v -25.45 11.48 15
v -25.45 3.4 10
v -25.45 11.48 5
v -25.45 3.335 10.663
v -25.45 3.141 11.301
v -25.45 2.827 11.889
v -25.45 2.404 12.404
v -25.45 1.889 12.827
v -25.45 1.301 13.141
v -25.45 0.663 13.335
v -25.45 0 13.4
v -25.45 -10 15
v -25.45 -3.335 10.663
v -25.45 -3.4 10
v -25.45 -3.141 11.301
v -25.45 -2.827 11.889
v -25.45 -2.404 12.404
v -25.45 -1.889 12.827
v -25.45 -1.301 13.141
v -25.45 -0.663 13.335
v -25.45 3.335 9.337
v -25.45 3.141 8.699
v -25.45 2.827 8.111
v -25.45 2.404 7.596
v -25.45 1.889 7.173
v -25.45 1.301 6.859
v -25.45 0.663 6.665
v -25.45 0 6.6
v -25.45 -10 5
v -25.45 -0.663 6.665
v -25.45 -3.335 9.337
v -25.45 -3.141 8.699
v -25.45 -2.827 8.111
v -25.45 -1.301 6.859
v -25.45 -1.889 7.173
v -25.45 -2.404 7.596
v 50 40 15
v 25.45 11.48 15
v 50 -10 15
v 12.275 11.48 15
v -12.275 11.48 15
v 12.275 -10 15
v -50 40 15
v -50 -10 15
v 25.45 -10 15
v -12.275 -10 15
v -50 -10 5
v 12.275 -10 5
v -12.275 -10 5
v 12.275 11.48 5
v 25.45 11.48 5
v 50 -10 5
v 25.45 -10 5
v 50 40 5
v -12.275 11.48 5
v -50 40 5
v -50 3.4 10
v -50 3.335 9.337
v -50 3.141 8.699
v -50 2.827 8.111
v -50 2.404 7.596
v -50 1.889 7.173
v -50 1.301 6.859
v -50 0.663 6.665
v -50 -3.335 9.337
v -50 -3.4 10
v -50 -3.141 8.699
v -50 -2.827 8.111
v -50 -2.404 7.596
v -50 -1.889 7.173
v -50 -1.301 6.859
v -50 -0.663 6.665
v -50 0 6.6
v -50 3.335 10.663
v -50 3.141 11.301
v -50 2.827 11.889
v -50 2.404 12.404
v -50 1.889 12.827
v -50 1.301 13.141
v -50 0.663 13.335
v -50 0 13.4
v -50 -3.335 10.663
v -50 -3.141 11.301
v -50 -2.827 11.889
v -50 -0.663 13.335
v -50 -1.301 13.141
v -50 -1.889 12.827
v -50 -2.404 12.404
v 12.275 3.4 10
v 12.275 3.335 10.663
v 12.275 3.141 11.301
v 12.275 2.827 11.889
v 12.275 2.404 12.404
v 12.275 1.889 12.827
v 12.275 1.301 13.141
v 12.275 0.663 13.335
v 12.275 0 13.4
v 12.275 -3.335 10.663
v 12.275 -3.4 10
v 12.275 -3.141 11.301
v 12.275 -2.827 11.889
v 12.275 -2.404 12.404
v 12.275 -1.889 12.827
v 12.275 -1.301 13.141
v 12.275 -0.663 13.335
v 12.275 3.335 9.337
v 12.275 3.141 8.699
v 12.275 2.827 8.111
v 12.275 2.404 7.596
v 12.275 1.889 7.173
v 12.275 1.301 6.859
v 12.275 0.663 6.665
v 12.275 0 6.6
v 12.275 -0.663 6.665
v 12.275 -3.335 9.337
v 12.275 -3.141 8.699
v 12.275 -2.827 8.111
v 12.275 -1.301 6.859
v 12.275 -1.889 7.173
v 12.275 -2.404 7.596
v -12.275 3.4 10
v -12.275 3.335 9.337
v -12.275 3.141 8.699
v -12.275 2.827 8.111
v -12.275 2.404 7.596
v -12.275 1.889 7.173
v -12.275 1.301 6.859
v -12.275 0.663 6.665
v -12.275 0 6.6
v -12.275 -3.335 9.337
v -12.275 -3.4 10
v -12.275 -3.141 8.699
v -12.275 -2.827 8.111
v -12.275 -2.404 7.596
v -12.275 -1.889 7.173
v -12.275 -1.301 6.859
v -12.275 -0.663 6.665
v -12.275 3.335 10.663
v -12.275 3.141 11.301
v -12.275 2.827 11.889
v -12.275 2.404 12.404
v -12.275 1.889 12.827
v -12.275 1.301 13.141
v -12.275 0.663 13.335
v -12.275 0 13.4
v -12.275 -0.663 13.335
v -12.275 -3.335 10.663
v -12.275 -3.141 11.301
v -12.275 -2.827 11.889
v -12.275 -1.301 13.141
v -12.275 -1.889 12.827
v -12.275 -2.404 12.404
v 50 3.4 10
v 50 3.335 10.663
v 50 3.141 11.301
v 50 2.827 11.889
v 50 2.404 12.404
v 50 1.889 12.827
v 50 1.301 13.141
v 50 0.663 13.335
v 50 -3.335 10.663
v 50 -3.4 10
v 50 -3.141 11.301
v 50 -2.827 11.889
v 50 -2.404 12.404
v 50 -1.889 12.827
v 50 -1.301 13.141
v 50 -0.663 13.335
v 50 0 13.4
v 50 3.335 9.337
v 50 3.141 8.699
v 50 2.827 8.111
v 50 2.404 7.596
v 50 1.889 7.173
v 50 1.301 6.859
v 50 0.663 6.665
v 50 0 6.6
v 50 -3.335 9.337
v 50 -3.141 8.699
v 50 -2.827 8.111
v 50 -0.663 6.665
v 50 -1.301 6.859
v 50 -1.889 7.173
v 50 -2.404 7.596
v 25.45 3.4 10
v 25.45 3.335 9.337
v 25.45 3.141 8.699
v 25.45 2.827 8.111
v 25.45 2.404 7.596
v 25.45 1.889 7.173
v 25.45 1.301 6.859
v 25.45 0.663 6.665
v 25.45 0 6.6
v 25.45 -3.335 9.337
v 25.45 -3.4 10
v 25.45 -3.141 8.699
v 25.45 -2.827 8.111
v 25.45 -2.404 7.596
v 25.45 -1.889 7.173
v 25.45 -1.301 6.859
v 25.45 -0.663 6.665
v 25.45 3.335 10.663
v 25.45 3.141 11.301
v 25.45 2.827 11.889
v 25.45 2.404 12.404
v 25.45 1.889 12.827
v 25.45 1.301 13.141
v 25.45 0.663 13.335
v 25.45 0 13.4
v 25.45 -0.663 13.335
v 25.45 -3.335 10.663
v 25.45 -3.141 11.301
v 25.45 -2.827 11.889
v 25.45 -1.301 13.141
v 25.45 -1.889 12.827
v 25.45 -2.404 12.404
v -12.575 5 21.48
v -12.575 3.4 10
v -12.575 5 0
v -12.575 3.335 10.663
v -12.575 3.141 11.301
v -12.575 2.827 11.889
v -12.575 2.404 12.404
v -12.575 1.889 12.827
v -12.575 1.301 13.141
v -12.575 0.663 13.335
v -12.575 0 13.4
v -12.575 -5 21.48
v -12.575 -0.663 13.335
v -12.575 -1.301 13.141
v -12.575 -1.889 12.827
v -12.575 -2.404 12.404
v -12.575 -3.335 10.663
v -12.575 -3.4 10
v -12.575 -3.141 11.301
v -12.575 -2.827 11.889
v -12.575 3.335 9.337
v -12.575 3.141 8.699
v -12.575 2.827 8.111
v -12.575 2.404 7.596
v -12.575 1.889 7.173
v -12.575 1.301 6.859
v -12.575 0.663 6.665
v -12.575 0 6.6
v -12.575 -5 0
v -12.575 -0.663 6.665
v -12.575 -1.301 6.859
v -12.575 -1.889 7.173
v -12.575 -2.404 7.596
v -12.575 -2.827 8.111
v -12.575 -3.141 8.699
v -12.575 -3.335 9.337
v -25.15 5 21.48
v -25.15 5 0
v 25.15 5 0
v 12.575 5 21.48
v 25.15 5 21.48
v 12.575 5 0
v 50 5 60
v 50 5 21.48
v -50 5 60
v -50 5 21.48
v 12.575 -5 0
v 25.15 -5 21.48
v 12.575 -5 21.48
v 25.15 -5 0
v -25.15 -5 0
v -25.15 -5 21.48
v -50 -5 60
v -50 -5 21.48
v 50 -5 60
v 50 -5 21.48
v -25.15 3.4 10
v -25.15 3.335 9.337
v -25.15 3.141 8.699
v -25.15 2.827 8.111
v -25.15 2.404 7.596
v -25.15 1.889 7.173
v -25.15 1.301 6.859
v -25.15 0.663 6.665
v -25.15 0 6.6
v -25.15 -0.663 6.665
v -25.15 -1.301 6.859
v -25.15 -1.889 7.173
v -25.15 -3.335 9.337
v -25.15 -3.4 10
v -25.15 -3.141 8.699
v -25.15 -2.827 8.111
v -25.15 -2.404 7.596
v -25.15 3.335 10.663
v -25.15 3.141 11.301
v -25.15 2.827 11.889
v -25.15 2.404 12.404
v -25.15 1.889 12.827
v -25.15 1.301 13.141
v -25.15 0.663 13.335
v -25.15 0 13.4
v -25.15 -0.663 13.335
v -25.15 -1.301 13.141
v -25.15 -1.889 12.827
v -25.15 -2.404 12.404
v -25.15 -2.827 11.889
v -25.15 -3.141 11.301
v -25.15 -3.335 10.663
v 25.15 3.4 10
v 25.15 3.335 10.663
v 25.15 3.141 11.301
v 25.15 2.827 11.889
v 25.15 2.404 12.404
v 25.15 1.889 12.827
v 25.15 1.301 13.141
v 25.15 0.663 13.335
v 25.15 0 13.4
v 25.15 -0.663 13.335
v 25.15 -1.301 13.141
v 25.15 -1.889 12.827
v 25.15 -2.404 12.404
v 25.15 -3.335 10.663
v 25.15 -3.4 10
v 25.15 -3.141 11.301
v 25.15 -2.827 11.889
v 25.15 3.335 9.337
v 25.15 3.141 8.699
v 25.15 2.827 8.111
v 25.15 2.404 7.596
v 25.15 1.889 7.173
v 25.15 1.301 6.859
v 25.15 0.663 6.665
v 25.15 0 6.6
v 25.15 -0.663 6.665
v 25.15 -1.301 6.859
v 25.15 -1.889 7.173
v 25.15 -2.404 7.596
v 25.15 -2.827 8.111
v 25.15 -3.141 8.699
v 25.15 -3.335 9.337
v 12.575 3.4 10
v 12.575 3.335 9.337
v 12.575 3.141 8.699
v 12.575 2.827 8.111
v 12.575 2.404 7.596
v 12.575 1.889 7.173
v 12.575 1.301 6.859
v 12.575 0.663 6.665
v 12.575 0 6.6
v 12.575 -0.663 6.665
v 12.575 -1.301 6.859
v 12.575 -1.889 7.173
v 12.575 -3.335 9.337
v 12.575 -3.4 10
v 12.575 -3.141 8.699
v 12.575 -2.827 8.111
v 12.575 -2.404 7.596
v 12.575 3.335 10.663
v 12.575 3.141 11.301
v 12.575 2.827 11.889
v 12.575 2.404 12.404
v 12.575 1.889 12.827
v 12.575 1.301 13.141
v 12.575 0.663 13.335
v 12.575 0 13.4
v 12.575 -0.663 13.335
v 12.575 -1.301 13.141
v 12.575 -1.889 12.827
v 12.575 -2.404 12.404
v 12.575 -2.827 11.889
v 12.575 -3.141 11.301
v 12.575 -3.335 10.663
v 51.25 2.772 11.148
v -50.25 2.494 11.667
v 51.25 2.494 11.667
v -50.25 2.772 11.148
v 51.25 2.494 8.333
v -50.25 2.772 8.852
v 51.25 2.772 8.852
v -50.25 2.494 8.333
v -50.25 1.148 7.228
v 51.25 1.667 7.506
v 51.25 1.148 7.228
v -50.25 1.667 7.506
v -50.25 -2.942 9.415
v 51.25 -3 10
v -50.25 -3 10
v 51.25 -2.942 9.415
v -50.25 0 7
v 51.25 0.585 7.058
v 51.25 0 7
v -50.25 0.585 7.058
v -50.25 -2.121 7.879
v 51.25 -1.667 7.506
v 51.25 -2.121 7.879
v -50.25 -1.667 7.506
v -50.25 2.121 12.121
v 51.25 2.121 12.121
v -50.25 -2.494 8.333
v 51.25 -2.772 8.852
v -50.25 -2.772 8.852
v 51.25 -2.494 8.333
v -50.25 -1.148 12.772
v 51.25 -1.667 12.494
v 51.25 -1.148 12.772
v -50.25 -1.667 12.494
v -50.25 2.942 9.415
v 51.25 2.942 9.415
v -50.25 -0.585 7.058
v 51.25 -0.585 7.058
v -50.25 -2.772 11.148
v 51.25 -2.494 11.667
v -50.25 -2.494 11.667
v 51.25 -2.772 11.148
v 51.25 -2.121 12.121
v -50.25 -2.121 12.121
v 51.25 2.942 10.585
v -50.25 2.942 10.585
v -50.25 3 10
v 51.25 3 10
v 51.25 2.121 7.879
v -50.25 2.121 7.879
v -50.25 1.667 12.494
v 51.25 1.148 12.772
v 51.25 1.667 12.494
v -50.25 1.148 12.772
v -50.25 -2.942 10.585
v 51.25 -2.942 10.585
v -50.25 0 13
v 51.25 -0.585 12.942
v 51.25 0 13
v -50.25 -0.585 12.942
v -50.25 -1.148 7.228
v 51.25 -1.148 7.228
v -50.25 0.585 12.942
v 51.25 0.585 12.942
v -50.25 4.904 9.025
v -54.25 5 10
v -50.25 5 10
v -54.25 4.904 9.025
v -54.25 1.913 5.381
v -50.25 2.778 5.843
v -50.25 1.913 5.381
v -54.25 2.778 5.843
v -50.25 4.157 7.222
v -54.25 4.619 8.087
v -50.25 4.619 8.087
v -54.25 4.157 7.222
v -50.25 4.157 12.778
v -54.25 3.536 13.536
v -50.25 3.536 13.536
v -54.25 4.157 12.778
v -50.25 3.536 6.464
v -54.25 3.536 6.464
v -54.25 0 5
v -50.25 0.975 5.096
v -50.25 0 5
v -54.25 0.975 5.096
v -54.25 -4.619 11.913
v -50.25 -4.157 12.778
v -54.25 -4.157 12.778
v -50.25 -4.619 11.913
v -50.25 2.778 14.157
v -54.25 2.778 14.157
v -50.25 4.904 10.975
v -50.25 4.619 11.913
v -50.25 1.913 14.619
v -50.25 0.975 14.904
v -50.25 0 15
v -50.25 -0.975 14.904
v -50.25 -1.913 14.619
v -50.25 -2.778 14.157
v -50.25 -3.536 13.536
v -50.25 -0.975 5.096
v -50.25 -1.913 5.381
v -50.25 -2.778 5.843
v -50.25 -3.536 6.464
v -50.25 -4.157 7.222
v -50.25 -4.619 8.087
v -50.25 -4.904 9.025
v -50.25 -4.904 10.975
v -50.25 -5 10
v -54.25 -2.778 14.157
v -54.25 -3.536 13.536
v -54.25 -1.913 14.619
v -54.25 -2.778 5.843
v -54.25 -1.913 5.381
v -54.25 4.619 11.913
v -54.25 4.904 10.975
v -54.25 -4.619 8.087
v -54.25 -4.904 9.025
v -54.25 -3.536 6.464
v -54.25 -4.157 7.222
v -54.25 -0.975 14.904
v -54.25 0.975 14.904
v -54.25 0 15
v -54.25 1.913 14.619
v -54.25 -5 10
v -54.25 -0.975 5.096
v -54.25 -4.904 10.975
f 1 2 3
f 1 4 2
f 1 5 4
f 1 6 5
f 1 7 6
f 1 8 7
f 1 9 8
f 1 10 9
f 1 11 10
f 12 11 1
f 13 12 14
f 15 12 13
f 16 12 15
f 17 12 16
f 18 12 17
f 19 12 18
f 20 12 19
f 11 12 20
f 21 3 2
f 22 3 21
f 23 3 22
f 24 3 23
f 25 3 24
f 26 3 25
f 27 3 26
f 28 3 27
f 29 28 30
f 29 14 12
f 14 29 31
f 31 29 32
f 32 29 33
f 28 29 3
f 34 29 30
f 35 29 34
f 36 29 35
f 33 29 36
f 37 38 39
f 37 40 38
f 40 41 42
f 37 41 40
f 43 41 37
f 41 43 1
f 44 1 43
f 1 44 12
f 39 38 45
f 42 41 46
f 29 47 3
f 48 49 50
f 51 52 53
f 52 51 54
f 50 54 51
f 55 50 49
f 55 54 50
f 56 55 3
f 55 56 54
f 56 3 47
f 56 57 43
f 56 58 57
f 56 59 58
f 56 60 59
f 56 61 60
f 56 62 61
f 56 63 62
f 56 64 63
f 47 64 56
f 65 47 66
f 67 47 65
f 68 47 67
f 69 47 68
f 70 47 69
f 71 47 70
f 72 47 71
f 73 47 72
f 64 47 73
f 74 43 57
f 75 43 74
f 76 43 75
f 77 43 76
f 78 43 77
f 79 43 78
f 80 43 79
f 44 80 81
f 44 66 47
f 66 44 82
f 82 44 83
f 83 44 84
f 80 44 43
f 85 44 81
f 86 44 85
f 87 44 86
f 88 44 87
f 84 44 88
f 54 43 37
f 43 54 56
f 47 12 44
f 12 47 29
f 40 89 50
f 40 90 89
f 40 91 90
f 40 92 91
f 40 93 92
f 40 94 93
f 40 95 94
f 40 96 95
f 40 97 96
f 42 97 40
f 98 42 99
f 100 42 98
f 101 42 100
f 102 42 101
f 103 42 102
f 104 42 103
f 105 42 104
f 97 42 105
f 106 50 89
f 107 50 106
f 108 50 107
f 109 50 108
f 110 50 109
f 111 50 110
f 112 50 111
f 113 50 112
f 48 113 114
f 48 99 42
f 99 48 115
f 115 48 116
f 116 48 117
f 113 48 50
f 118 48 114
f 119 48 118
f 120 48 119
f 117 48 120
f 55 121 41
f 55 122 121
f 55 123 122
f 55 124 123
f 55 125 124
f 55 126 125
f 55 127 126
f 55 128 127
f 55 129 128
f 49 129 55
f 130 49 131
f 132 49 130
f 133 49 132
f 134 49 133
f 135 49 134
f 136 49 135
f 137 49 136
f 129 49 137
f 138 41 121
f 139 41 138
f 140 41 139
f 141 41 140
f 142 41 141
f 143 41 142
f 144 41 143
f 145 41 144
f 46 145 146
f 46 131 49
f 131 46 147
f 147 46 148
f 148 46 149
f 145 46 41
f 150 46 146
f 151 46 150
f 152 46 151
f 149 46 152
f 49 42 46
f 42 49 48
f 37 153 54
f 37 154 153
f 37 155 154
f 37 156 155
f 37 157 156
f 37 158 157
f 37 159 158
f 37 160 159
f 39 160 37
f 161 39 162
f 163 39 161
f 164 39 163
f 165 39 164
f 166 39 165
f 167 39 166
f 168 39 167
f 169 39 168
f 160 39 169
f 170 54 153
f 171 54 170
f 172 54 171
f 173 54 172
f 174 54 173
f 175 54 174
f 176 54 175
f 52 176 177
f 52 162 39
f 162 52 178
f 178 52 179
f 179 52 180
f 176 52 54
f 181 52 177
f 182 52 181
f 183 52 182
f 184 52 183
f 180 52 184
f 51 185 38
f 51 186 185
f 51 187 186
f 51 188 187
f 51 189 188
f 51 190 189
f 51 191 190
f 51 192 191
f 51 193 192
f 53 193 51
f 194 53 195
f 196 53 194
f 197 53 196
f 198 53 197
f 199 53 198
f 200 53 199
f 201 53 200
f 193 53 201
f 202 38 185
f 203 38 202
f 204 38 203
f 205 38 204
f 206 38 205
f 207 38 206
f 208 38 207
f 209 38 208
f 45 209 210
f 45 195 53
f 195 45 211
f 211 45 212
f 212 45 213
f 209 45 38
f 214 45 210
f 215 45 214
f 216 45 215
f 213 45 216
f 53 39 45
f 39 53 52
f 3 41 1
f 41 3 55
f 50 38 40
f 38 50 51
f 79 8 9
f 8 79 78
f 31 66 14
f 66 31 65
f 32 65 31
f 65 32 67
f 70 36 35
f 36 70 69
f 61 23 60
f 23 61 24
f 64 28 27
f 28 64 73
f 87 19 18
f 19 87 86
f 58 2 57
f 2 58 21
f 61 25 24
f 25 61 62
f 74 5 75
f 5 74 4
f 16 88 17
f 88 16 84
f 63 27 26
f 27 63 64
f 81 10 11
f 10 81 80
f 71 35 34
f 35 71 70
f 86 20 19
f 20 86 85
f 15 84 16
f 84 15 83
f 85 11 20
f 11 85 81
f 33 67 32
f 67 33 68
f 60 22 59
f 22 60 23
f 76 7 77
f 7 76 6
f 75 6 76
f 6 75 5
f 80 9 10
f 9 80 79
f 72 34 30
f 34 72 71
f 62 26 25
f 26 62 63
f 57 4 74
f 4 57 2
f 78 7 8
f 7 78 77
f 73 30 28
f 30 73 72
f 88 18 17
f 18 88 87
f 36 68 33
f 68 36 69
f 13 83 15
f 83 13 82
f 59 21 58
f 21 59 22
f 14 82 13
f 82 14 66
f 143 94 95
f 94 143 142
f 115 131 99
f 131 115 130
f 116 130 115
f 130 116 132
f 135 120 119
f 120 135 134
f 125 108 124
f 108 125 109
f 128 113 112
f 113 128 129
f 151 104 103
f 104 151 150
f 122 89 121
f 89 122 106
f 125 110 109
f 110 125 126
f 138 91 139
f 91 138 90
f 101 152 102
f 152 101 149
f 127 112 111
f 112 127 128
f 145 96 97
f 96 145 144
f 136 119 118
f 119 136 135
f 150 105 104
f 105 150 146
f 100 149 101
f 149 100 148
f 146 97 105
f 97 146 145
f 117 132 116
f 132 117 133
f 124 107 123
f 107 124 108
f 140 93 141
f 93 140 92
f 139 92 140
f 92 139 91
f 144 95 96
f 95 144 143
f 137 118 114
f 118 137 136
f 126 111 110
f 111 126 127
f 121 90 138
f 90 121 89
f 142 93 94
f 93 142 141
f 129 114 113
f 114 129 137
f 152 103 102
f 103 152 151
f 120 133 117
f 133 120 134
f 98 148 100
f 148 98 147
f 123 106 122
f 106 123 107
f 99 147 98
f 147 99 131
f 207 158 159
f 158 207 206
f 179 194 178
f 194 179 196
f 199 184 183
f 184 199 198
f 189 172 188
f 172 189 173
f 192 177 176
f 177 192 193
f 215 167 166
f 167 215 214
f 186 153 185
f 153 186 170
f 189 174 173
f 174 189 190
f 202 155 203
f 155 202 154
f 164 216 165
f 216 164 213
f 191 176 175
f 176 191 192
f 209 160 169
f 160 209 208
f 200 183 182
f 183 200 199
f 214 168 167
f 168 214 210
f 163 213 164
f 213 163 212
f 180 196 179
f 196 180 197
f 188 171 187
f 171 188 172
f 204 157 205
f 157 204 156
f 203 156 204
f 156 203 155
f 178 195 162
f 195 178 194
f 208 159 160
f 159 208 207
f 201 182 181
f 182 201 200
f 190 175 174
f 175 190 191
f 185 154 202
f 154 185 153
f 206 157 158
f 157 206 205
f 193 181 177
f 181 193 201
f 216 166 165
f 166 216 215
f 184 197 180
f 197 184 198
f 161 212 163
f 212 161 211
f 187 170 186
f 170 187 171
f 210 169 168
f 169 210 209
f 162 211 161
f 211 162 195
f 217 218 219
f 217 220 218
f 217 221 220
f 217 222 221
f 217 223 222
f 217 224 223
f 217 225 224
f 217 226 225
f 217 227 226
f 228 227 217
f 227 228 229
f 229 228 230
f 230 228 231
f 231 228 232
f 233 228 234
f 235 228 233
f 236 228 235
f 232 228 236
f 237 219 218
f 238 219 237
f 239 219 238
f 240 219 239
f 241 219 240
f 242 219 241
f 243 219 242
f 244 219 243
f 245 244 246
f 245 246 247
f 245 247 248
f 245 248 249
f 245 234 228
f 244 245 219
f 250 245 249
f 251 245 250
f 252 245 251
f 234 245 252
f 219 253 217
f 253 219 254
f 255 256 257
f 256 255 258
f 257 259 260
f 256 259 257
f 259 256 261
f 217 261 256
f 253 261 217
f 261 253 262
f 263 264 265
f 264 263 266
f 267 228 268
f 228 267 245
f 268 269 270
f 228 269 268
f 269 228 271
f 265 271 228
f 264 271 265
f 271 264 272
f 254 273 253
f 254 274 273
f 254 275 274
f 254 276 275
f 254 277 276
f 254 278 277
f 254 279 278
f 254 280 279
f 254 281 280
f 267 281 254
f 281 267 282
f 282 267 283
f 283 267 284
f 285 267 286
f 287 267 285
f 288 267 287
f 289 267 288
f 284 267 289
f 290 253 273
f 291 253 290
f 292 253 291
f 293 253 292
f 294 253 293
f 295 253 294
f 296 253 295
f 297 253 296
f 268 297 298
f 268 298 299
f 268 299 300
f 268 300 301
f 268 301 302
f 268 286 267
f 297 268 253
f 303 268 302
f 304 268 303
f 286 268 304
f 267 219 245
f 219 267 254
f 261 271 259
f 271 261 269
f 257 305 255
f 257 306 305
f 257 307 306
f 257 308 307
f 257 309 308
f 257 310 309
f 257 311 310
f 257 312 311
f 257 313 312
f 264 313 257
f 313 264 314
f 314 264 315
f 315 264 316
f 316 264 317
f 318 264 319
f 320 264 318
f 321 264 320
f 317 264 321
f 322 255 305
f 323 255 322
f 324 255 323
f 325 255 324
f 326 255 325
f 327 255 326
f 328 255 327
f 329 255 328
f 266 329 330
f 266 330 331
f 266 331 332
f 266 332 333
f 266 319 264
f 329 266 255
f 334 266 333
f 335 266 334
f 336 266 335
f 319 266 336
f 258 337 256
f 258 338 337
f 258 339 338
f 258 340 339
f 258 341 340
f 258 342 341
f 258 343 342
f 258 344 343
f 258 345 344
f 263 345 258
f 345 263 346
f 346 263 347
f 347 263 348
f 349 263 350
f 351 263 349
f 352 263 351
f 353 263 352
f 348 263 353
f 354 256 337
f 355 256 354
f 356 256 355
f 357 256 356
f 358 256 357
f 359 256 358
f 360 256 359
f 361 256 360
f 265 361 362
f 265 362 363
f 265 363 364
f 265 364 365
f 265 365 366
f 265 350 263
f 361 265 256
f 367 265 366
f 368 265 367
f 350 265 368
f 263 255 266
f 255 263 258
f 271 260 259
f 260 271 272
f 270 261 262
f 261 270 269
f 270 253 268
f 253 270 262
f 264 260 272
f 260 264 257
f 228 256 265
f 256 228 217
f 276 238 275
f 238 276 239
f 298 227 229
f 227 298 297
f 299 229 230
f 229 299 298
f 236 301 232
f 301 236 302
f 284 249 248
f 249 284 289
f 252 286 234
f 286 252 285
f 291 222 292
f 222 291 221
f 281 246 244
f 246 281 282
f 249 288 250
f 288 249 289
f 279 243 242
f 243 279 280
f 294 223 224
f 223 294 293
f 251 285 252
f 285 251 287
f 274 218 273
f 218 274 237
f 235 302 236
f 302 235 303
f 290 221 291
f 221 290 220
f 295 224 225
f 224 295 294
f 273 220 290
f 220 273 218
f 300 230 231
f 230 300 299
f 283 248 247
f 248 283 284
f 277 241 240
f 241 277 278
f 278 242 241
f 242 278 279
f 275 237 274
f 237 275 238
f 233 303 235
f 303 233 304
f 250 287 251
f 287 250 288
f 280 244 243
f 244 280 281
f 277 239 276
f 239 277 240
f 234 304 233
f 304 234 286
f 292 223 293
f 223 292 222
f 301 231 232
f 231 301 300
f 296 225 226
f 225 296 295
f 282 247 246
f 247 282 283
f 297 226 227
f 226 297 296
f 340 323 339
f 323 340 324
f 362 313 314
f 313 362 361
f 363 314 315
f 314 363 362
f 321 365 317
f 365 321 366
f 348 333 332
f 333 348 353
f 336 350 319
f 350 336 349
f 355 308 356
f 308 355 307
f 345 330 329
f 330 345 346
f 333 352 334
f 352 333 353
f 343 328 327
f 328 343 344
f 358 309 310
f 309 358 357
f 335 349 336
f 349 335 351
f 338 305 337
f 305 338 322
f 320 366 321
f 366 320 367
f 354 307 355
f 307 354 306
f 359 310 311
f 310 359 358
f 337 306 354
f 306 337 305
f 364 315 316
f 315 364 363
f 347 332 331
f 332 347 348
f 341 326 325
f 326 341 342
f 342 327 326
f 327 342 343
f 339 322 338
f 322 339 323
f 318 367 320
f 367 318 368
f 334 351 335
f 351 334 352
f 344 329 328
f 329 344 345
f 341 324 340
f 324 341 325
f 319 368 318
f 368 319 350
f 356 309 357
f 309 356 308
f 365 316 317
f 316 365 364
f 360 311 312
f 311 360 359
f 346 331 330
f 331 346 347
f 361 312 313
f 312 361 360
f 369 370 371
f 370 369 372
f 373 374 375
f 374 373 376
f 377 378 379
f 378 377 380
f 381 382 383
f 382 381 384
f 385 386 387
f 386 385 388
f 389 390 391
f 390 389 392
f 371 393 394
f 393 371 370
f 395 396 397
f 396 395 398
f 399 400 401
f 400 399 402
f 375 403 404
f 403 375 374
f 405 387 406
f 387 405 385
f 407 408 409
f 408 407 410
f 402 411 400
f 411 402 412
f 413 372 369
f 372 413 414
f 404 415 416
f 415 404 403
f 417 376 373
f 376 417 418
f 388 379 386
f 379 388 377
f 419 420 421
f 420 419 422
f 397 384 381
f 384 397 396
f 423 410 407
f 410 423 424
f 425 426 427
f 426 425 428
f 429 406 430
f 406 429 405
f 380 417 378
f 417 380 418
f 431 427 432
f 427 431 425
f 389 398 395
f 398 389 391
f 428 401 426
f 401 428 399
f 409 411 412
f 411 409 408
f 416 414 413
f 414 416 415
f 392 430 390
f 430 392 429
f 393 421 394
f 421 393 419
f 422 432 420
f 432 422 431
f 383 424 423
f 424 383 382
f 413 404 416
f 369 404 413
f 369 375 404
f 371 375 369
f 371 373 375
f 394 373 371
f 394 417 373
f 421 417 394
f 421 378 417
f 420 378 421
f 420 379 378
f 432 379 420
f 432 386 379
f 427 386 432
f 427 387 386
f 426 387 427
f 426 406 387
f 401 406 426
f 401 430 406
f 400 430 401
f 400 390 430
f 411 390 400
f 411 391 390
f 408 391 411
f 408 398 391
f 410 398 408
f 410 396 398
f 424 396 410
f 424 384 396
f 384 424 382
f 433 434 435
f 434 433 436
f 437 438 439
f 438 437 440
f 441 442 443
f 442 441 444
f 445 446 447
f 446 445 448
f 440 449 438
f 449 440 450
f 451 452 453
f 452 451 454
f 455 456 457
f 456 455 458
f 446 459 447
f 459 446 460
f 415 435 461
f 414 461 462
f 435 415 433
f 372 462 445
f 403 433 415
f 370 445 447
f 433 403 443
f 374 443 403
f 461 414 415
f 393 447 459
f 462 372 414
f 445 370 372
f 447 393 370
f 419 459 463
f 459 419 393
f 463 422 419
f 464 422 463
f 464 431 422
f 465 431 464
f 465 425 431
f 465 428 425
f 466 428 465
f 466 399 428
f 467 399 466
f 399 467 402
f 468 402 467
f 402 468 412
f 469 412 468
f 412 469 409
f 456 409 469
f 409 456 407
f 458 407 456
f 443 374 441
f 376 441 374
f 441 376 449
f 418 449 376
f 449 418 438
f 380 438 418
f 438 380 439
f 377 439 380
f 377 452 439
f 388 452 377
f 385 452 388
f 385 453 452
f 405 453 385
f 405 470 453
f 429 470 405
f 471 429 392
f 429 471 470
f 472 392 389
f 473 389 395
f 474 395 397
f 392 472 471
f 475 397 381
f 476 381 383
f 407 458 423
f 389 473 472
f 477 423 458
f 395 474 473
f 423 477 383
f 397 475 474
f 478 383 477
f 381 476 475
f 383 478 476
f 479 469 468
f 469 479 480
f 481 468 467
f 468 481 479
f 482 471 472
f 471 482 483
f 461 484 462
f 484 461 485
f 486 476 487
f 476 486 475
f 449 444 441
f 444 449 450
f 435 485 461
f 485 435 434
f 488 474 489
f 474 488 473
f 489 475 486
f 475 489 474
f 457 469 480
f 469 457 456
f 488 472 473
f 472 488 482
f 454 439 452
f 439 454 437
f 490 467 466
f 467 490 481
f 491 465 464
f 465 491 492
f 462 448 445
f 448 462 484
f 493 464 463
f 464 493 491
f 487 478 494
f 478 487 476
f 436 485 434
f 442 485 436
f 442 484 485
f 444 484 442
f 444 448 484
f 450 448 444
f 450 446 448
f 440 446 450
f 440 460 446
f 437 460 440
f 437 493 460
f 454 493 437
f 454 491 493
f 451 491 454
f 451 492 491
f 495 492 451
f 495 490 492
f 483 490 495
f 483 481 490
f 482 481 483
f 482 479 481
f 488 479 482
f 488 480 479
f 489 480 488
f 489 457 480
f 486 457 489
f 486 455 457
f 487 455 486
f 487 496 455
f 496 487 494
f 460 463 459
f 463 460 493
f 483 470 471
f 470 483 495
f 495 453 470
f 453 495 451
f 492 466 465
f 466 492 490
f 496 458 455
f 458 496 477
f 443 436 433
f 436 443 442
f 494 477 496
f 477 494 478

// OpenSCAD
$fn = 32;

// ------------------------------------------------------------------------
// Butt hinge: hinge 100 mm, leaf swung 270 deg
// Every part is its own module, assembly() places every instance.
// ------------------------------------------------------------------------

// --- part 1 ---
module hinge_base() {
  difference() {
    union() {
      translate([-50, -10, -5]) cube([24.55, 50, 10]);
      translate([-12.275, -10, -5]) cube([24.55, 50, 10]);
      translate([25.45, -10, -5]) cube([24.55, 50, 10]);
      translate([-50, 11.48, -5]) cube([100, 28.52, 10]);
    }
    translate([-37.725, 0, 0]) rotate([0, 90, 0]) cylinder(h = 26.55, d = 6.8, center = true);
    translate([0, 0, 0]) rotate([0, 90, 0]) cylinder(h = 26.55, d = 6.8, center = true);
    translate([37.725, 0, 0]) rotate([0, 90, 0]) cylinder(h = 26.55, d = 6.8, center = true);
  }
}

// --- part 2 ---
module hinge_mover() {
  difference() {
    union() {
      translate([-25.15, -50, -5]) cube([12.575, 60, 10]);
      translate([12.575, -50, -5]) cube([12.575, 60, 10]);
      translate([-50, -50, -5]) cube([100, 38.52, 10]);
    }
    translate([-18.863, 0, 0]) rotate([0, 90, 0]) cylinder(h = 14.575, d = 6.8, center = true);
    translate([18.863, 0, 0]) rotate([0, 90, 0]) cylinder(h = 14.575, d = 6.8, center = true);
  }
}

// --- part 3 ---
module hinge_pin() {
  rotate([0, 90, 0]) cylinder(h = 102.5, d = 6, center = true);
  translate([-54.25, 0, 0]) rotate([0, 90, 0]) cylinder(h = 4, d = 10);
}

// --- assembly ---
module assembly() {
  color([0.80, 0.24, 0.20]) translate([0, 0, 10]) rotate([0, 0, 0]) hinge_base();
  color([0.20, 0.45, 0.75]) translate([0, 0, 10]) rotate([270, 0, 0]) hinge_mover();
  color([0.25, 0.62, 0.32]) translate([0, 0, 10]) rotate([0, 0, 0]) hinge_pin();
}

assembly();
